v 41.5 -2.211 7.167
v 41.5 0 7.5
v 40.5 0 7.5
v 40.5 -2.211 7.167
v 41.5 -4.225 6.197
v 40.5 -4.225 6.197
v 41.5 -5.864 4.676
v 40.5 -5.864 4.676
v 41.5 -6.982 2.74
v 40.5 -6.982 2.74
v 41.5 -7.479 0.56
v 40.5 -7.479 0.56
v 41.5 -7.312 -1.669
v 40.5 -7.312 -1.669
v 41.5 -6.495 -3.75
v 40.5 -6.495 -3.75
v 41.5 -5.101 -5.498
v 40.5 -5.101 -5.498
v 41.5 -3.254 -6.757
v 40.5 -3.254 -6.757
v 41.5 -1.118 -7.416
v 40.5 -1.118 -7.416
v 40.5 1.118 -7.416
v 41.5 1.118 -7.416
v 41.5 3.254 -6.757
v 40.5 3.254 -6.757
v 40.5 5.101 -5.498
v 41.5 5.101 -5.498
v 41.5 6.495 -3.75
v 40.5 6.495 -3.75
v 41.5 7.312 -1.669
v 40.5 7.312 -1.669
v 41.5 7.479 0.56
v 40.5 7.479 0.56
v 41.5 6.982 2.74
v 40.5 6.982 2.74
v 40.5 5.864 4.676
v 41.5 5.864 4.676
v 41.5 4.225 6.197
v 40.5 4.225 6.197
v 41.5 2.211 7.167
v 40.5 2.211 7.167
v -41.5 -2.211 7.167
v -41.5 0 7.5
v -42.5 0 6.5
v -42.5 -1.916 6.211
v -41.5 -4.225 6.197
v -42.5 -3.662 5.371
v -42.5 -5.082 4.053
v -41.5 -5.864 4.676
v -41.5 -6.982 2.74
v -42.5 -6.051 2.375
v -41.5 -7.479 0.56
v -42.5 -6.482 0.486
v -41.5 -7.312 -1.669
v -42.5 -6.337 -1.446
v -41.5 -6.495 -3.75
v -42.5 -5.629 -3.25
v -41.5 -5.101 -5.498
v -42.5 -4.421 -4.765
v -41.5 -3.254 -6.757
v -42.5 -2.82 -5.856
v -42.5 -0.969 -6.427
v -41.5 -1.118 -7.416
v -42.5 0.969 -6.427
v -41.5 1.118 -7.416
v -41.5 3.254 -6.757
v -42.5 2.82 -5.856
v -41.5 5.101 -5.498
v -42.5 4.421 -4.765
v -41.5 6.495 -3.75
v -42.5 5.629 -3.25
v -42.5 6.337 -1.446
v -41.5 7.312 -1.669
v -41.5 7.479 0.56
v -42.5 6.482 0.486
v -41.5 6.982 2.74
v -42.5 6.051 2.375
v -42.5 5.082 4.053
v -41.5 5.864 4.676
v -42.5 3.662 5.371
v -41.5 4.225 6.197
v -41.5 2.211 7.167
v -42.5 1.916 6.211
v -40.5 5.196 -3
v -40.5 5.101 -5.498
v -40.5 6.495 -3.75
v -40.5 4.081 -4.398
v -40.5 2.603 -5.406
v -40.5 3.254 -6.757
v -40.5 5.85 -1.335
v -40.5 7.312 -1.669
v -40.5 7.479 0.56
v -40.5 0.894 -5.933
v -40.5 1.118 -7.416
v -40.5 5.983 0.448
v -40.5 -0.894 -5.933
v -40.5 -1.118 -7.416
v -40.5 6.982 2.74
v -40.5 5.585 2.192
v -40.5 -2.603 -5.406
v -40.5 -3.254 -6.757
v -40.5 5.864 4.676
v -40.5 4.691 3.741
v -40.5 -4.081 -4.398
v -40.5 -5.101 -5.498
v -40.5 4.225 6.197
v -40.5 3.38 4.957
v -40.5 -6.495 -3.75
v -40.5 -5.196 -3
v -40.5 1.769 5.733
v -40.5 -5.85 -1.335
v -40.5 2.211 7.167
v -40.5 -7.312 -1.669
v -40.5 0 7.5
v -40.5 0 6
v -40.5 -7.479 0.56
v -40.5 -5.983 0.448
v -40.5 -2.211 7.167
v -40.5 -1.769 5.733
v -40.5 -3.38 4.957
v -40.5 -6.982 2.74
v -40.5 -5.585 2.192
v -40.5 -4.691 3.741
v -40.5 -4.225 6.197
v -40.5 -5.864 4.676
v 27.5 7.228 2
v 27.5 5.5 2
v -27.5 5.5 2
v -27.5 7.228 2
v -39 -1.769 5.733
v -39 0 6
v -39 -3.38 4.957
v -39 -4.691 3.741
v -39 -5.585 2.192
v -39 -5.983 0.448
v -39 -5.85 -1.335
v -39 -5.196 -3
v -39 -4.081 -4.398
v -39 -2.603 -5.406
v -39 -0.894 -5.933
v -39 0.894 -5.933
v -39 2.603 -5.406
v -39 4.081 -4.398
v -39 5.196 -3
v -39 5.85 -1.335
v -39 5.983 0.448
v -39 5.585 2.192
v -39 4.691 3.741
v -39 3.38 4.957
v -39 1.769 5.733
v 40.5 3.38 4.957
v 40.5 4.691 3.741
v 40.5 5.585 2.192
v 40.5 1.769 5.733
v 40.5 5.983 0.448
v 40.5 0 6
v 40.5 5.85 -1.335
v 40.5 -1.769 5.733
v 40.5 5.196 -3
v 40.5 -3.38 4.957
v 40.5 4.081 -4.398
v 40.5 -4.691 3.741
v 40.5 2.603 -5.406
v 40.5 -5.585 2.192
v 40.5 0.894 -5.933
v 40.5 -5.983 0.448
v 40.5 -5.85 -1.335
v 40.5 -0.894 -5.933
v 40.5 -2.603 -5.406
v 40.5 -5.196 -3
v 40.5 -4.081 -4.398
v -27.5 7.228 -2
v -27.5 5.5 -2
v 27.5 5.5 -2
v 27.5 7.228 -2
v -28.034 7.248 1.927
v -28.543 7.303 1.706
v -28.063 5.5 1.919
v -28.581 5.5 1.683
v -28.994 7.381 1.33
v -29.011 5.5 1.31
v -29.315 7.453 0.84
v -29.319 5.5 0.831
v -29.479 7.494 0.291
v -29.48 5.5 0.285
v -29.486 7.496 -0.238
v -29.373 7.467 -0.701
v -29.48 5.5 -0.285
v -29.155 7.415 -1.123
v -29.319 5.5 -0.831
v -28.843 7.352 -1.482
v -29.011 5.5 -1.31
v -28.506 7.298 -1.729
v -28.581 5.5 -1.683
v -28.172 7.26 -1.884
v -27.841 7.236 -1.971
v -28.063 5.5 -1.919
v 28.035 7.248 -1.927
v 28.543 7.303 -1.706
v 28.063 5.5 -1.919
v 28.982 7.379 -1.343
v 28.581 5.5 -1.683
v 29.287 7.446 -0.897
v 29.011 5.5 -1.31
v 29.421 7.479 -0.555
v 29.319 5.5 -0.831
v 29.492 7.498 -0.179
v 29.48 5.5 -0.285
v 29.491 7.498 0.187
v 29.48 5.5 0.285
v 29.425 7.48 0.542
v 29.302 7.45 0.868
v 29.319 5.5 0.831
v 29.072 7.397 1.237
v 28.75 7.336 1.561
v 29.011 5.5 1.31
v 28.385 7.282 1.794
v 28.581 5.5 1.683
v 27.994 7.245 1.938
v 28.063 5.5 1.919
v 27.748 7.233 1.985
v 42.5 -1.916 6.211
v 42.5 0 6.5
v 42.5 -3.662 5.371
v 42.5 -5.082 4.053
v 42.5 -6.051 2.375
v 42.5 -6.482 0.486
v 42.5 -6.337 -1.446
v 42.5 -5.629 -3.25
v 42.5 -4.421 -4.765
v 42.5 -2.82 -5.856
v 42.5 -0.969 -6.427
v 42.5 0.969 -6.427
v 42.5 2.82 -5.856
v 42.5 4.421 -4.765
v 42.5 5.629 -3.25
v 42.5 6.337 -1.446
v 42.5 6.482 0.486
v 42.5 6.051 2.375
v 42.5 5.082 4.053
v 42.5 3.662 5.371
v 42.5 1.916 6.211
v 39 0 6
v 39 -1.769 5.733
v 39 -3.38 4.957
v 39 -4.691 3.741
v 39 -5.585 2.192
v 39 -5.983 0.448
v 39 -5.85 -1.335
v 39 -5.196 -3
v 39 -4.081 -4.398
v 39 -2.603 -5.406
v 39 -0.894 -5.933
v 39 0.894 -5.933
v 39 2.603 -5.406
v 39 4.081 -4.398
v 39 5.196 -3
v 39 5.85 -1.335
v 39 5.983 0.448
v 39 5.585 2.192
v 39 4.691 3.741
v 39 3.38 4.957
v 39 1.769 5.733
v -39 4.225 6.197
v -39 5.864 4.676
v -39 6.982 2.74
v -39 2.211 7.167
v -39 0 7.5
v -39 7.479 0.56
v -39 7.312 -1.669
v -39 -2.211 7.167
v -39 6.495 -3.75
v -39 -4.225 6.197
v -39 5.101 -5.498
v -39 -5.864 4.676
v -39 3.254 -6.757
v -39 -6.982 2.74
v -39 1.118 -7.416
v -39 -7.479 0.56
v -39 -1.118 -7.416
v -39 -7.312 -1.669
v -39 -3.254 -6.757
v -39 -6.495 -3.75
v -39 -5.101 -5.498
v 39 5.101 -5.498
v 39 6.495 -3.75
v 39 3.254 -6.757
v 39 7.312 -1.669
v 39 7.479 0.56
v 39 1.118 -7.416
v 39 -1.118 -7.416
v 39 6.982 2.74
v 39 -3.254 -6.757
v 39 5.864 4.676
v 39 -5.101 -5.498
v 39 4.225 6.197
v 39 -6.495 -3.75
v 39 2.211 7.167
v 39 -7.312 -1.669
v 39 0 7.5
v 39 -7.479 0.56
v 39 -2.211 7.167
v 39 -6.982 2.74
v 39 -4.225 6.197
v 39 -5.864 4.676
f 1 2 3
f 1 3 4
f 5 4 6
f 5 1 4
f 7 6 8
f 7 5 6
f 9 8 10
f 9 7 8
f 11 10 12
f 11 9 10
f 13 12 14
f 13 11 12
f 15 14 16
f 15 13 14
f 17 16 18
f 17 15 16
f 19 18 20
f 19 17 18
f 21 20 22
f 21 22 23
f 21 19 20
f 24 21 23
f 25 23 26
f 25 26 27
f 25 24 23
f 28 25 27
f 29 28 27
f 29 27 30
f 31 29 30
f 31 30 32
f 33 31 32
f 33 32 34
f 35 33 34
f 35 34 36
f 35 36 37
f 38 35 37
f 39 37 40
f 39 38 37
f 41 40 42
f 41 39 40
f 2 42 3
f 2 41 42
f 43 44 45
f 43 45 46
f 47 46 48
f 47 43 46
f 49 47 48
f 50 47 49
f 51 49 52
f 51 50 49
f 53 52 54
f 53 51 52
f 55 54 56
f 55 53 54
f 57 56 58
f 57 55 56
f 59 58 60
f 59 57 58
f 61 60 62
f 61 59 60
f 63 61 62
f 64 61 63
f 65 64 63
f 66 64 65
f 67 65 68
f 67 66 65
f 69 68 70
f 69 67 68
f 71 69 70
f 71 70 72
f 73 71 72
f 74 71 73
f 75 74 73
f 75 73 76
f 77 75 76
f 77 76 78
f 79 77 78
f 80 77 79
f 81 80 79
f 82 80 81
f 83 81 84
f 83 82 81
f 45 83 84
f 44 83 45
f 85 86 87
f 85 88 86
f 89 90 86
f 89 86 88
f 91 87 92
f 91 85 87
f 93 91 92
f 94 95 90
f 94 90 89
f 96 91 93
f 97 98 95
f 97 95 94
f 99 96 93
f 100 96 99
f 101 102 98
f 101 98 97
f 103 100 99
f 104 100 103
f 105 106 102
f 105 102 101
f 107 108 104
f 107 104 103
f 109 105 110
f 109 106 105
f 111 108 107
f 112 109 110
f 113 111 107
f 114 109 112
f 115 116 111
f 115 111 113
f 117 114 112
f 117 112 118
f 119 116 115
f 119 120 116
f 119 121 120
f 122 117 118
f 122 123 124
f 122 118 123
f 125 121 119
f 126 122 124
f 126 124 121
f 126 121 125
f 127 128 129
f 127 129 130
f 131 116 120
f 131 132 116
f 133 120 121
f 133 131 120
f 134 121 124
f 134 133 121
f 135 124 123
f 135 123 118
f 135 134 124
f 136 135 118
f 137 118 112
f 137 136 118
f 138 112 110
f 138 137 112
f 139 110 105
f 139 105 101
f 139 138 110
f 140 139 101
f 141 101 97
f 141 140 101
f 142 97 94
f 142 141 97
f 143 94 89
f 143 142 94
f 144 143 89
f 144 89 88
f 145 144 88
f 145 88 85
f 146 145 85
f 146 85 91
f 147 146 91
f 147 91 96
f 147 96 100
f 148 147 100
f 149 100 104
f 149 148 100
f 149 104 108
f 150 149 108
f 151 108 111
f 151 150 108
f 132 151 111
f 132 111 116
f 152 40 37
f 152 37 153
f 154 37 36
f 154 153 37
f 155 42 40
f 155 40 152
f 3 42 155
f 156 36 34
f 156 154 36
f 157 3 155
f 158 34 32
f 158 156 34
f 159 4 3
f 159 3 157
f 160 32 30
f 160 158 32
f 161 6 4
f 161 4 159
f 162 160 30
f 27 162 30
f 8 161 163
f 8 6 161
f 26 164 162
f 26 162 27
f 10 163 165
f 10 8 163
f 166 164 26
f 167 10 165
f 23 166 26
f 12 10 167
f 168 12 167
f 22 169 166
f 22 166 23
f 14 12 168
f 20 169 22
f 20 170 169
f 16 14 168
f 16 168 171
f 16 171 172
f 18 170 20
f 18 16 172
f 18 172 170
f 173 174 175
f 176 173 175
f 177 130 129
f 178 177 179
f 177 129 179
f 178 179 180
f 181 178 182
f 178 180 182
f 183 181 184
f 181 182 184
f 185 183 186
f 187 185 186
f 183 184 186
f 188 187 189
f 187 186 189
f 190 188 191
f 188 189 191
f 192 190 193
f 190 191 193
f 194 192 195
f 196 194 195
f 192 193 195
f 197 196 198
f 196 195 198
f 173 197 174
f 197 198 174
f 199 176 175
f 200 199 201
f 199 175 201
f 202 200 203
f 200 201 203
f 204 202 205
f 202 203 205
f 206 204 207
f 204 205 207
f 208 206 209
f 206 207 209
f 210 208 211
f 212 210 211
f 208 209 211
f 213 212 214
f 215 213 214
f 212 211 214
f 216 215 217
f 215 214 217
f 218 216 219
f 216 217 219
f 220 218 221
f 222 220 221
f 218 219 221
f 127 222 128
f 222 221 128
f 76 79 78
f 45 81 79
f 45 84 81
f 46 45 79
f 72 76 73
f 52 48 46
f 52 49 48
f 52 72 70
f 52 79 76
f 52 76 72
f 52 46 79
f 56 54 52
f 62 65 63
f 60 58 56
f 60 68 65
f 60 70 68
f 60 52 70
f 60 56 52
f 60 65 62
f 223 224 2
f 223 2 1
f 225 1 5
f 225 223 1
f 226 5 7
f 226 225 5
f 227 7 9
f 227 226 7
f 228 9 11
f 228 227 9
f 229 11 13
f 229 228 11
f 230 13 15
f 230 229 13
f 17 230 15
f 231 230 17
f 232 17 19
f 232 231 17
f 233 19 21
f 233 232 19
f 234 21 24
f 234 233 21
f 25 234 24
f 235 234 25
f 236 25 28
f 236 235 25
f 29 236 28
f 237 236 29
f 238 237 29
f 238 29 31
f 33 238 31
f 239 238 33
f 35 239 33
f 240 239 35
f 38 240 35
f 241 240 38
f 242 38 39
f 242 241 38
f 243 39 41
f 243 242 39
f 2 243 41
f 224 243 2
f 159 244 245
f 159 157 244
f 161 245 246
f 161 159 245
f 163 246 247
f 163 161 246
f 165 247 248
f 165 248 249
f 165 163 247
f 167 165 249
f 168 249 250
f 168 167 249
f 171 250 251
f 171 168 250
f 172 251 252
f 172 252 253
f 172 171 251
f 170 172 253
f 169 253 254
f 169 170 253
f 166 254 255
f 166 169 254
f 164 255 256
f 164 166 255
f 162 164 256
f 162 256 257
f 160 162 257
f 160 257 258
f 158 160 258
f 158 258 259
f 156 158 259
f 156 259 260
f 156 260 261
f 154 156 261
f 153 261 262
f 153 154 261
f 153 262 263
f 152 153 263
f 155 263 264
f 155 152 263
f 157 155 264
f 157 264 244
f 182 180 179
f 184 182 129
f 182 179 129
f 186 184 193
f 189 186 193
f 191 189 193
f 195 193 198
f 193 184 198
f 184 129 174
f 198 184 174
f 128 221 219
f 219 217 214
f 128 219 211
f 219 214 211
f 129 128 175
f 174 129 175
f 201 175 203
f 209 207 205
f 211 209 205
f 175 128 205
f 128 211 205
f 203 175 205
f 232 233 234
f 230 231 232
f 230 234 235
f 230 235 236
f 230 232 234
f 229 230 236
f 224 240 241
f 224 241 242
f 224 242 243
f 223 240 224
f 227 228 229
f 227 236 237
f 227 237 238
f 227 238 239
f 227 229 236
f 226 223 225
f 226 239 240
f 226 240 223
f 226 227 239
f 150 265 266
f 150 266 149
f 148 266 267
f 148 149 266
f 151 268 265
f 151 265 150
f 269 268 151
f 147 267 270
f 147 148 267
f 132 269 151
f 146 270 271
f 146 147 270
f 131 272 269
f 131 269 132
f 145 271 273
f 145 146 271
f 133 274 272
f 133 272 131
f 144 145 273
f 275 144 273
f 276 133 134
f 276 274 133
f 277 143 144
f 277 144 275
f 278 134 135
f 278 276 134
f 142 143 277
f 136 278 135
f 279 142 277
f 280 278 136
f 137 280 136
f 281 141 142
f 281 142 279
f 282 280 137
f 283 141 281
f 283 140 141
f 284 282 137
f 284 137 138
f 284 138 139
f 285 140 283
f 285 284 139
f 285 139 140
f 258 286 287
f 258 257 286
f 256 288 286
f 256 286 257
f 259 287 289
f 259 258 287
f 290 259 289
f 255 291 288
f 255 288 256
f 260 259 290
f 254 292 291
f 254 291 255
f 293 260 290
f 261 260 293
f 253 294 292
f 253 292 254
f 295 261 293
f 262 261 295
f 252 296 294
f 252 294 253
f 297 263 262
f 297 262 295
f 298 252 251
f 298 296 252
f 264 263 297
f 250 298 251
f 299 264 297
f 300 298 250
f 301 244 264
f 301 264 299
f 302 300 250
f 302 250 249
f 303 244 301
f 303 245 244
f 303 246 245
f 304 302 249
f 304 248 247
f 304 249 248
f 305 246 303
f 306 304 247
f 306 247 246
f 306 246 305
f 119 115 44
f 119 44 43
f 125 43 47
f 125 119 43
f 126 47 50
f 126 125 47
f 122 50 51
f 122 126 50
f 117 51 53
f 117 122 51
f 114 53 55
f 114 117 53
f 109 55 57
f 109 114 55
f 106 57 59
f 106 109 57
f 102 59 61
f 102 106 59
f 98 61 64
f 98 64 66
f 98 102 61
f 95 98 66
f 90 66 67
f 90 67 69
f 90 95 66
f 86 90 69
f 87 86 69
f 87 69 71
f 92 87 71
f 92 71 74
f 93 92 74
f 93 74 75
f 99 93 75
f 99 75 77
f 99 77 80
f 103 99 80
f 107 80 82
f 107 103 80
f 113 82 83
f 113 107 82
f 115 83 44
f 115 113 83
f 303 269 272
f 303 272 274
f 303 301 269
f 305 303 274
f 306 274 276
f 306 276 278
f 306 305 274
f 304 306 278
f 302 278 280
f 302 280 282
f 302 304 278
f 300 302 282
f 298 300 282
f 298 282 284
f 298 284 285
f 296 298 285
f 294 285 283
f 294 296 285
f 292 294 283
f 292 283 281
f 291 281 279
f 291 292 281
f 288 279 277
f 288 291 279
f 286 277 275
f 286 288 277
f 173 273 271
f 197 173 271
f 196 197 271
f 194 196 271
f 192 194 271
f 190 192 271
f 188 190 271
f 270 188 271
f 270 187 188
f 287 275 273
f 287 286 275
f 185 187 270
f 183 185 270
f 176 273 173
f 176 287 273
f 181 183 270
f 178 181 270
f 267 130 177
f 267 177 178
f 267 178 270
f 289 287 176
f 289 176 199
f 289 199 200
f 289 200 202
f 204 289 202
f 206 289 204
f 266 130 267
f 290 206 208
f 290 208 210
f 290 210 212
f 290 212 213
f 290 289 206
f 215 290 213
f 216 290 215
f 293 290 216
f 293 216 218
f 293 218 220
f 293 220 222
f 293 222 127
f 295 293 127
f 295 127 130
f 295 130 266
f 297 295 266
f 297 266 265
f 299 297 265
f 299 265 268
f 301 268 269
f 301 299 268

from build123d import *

# Parameters (mm, degrees)
CHAMFER1_SIZE      = 1
SKETCH3_W          = 4
SKETCH3_H          = 4
CUT_EXTRUDE1_DEPTH = 10
CUT_EXTRUDE2_DEPTH = 10


with BuildPart() as part:
    # Sketch1 → Revolve1 (revolve)
    with BuildSketch(Plane.XY, mode=Mode.PRIVATE) as revolve1_sk:
        Polygon((-42.5, 0), (-42.5, 7.5), (-40.5, 7.5), (-40.5, 6), (-39, 6), (-39, 7.5), (39, 7.5), (39, 6), (40.5, 6), (40.5, 7.5), (42.5, 7.5), (42.5, 0), align=None)
    revolve(revolve1_sk.sketch.rotate(Axis((-47.151991765, 0, 0), (1, 0, 0)), 90), axis=Axis((-47.151991765, 0, 0), (1, 0, 0)))

    # Chamfer1
    chamfer1_edges = [part.edges().sort_by_distance(p)[0] for p in [
        (42.5, 0, -7.5),
        (-42.5, 0, -7.5),
    ]]
    chamfer(chamfer1_edges, length=CHAMFER1_SIZE)

    # Sketch3 → Cut-Extrude1 (cut)
    with BuildSketch(Plane(origin=(0, 0, 0), x_dir=(0, 0, -1), z_dir=(1, 0, 0))):
        with Locations((0, 7.5)):
            Rectangle(SKETCH3_W, SKETCH3_H)
    extrude(amount=-CUT_EXTRUDE1_DEPTH, mode=Mode.SUBTRACT)

    # Sketch4 → Cut-Extrude2 (cut)
    with BuildSketch(Plane(origin=(0, 5.5, 0), x_dir=(1, 0, 0), z_dir=(0, 1, 0))):
        with BuildLine():
            Line((27.5, -2), (-27.5, -2))
            ThreePointArc((-27.5, -2), (-29.5, 0), (-27.5, 2))
            Line((-27.5, 2), (27.5, 2))
            ThreePointArc((27.5, 2), (29.5, 0), (27.5, -2))
        make_face()
    extrude(amount=CUT_EXTRUDE2_DEPTH, mode=Mode.SUBTRACT)


solid = part.part
